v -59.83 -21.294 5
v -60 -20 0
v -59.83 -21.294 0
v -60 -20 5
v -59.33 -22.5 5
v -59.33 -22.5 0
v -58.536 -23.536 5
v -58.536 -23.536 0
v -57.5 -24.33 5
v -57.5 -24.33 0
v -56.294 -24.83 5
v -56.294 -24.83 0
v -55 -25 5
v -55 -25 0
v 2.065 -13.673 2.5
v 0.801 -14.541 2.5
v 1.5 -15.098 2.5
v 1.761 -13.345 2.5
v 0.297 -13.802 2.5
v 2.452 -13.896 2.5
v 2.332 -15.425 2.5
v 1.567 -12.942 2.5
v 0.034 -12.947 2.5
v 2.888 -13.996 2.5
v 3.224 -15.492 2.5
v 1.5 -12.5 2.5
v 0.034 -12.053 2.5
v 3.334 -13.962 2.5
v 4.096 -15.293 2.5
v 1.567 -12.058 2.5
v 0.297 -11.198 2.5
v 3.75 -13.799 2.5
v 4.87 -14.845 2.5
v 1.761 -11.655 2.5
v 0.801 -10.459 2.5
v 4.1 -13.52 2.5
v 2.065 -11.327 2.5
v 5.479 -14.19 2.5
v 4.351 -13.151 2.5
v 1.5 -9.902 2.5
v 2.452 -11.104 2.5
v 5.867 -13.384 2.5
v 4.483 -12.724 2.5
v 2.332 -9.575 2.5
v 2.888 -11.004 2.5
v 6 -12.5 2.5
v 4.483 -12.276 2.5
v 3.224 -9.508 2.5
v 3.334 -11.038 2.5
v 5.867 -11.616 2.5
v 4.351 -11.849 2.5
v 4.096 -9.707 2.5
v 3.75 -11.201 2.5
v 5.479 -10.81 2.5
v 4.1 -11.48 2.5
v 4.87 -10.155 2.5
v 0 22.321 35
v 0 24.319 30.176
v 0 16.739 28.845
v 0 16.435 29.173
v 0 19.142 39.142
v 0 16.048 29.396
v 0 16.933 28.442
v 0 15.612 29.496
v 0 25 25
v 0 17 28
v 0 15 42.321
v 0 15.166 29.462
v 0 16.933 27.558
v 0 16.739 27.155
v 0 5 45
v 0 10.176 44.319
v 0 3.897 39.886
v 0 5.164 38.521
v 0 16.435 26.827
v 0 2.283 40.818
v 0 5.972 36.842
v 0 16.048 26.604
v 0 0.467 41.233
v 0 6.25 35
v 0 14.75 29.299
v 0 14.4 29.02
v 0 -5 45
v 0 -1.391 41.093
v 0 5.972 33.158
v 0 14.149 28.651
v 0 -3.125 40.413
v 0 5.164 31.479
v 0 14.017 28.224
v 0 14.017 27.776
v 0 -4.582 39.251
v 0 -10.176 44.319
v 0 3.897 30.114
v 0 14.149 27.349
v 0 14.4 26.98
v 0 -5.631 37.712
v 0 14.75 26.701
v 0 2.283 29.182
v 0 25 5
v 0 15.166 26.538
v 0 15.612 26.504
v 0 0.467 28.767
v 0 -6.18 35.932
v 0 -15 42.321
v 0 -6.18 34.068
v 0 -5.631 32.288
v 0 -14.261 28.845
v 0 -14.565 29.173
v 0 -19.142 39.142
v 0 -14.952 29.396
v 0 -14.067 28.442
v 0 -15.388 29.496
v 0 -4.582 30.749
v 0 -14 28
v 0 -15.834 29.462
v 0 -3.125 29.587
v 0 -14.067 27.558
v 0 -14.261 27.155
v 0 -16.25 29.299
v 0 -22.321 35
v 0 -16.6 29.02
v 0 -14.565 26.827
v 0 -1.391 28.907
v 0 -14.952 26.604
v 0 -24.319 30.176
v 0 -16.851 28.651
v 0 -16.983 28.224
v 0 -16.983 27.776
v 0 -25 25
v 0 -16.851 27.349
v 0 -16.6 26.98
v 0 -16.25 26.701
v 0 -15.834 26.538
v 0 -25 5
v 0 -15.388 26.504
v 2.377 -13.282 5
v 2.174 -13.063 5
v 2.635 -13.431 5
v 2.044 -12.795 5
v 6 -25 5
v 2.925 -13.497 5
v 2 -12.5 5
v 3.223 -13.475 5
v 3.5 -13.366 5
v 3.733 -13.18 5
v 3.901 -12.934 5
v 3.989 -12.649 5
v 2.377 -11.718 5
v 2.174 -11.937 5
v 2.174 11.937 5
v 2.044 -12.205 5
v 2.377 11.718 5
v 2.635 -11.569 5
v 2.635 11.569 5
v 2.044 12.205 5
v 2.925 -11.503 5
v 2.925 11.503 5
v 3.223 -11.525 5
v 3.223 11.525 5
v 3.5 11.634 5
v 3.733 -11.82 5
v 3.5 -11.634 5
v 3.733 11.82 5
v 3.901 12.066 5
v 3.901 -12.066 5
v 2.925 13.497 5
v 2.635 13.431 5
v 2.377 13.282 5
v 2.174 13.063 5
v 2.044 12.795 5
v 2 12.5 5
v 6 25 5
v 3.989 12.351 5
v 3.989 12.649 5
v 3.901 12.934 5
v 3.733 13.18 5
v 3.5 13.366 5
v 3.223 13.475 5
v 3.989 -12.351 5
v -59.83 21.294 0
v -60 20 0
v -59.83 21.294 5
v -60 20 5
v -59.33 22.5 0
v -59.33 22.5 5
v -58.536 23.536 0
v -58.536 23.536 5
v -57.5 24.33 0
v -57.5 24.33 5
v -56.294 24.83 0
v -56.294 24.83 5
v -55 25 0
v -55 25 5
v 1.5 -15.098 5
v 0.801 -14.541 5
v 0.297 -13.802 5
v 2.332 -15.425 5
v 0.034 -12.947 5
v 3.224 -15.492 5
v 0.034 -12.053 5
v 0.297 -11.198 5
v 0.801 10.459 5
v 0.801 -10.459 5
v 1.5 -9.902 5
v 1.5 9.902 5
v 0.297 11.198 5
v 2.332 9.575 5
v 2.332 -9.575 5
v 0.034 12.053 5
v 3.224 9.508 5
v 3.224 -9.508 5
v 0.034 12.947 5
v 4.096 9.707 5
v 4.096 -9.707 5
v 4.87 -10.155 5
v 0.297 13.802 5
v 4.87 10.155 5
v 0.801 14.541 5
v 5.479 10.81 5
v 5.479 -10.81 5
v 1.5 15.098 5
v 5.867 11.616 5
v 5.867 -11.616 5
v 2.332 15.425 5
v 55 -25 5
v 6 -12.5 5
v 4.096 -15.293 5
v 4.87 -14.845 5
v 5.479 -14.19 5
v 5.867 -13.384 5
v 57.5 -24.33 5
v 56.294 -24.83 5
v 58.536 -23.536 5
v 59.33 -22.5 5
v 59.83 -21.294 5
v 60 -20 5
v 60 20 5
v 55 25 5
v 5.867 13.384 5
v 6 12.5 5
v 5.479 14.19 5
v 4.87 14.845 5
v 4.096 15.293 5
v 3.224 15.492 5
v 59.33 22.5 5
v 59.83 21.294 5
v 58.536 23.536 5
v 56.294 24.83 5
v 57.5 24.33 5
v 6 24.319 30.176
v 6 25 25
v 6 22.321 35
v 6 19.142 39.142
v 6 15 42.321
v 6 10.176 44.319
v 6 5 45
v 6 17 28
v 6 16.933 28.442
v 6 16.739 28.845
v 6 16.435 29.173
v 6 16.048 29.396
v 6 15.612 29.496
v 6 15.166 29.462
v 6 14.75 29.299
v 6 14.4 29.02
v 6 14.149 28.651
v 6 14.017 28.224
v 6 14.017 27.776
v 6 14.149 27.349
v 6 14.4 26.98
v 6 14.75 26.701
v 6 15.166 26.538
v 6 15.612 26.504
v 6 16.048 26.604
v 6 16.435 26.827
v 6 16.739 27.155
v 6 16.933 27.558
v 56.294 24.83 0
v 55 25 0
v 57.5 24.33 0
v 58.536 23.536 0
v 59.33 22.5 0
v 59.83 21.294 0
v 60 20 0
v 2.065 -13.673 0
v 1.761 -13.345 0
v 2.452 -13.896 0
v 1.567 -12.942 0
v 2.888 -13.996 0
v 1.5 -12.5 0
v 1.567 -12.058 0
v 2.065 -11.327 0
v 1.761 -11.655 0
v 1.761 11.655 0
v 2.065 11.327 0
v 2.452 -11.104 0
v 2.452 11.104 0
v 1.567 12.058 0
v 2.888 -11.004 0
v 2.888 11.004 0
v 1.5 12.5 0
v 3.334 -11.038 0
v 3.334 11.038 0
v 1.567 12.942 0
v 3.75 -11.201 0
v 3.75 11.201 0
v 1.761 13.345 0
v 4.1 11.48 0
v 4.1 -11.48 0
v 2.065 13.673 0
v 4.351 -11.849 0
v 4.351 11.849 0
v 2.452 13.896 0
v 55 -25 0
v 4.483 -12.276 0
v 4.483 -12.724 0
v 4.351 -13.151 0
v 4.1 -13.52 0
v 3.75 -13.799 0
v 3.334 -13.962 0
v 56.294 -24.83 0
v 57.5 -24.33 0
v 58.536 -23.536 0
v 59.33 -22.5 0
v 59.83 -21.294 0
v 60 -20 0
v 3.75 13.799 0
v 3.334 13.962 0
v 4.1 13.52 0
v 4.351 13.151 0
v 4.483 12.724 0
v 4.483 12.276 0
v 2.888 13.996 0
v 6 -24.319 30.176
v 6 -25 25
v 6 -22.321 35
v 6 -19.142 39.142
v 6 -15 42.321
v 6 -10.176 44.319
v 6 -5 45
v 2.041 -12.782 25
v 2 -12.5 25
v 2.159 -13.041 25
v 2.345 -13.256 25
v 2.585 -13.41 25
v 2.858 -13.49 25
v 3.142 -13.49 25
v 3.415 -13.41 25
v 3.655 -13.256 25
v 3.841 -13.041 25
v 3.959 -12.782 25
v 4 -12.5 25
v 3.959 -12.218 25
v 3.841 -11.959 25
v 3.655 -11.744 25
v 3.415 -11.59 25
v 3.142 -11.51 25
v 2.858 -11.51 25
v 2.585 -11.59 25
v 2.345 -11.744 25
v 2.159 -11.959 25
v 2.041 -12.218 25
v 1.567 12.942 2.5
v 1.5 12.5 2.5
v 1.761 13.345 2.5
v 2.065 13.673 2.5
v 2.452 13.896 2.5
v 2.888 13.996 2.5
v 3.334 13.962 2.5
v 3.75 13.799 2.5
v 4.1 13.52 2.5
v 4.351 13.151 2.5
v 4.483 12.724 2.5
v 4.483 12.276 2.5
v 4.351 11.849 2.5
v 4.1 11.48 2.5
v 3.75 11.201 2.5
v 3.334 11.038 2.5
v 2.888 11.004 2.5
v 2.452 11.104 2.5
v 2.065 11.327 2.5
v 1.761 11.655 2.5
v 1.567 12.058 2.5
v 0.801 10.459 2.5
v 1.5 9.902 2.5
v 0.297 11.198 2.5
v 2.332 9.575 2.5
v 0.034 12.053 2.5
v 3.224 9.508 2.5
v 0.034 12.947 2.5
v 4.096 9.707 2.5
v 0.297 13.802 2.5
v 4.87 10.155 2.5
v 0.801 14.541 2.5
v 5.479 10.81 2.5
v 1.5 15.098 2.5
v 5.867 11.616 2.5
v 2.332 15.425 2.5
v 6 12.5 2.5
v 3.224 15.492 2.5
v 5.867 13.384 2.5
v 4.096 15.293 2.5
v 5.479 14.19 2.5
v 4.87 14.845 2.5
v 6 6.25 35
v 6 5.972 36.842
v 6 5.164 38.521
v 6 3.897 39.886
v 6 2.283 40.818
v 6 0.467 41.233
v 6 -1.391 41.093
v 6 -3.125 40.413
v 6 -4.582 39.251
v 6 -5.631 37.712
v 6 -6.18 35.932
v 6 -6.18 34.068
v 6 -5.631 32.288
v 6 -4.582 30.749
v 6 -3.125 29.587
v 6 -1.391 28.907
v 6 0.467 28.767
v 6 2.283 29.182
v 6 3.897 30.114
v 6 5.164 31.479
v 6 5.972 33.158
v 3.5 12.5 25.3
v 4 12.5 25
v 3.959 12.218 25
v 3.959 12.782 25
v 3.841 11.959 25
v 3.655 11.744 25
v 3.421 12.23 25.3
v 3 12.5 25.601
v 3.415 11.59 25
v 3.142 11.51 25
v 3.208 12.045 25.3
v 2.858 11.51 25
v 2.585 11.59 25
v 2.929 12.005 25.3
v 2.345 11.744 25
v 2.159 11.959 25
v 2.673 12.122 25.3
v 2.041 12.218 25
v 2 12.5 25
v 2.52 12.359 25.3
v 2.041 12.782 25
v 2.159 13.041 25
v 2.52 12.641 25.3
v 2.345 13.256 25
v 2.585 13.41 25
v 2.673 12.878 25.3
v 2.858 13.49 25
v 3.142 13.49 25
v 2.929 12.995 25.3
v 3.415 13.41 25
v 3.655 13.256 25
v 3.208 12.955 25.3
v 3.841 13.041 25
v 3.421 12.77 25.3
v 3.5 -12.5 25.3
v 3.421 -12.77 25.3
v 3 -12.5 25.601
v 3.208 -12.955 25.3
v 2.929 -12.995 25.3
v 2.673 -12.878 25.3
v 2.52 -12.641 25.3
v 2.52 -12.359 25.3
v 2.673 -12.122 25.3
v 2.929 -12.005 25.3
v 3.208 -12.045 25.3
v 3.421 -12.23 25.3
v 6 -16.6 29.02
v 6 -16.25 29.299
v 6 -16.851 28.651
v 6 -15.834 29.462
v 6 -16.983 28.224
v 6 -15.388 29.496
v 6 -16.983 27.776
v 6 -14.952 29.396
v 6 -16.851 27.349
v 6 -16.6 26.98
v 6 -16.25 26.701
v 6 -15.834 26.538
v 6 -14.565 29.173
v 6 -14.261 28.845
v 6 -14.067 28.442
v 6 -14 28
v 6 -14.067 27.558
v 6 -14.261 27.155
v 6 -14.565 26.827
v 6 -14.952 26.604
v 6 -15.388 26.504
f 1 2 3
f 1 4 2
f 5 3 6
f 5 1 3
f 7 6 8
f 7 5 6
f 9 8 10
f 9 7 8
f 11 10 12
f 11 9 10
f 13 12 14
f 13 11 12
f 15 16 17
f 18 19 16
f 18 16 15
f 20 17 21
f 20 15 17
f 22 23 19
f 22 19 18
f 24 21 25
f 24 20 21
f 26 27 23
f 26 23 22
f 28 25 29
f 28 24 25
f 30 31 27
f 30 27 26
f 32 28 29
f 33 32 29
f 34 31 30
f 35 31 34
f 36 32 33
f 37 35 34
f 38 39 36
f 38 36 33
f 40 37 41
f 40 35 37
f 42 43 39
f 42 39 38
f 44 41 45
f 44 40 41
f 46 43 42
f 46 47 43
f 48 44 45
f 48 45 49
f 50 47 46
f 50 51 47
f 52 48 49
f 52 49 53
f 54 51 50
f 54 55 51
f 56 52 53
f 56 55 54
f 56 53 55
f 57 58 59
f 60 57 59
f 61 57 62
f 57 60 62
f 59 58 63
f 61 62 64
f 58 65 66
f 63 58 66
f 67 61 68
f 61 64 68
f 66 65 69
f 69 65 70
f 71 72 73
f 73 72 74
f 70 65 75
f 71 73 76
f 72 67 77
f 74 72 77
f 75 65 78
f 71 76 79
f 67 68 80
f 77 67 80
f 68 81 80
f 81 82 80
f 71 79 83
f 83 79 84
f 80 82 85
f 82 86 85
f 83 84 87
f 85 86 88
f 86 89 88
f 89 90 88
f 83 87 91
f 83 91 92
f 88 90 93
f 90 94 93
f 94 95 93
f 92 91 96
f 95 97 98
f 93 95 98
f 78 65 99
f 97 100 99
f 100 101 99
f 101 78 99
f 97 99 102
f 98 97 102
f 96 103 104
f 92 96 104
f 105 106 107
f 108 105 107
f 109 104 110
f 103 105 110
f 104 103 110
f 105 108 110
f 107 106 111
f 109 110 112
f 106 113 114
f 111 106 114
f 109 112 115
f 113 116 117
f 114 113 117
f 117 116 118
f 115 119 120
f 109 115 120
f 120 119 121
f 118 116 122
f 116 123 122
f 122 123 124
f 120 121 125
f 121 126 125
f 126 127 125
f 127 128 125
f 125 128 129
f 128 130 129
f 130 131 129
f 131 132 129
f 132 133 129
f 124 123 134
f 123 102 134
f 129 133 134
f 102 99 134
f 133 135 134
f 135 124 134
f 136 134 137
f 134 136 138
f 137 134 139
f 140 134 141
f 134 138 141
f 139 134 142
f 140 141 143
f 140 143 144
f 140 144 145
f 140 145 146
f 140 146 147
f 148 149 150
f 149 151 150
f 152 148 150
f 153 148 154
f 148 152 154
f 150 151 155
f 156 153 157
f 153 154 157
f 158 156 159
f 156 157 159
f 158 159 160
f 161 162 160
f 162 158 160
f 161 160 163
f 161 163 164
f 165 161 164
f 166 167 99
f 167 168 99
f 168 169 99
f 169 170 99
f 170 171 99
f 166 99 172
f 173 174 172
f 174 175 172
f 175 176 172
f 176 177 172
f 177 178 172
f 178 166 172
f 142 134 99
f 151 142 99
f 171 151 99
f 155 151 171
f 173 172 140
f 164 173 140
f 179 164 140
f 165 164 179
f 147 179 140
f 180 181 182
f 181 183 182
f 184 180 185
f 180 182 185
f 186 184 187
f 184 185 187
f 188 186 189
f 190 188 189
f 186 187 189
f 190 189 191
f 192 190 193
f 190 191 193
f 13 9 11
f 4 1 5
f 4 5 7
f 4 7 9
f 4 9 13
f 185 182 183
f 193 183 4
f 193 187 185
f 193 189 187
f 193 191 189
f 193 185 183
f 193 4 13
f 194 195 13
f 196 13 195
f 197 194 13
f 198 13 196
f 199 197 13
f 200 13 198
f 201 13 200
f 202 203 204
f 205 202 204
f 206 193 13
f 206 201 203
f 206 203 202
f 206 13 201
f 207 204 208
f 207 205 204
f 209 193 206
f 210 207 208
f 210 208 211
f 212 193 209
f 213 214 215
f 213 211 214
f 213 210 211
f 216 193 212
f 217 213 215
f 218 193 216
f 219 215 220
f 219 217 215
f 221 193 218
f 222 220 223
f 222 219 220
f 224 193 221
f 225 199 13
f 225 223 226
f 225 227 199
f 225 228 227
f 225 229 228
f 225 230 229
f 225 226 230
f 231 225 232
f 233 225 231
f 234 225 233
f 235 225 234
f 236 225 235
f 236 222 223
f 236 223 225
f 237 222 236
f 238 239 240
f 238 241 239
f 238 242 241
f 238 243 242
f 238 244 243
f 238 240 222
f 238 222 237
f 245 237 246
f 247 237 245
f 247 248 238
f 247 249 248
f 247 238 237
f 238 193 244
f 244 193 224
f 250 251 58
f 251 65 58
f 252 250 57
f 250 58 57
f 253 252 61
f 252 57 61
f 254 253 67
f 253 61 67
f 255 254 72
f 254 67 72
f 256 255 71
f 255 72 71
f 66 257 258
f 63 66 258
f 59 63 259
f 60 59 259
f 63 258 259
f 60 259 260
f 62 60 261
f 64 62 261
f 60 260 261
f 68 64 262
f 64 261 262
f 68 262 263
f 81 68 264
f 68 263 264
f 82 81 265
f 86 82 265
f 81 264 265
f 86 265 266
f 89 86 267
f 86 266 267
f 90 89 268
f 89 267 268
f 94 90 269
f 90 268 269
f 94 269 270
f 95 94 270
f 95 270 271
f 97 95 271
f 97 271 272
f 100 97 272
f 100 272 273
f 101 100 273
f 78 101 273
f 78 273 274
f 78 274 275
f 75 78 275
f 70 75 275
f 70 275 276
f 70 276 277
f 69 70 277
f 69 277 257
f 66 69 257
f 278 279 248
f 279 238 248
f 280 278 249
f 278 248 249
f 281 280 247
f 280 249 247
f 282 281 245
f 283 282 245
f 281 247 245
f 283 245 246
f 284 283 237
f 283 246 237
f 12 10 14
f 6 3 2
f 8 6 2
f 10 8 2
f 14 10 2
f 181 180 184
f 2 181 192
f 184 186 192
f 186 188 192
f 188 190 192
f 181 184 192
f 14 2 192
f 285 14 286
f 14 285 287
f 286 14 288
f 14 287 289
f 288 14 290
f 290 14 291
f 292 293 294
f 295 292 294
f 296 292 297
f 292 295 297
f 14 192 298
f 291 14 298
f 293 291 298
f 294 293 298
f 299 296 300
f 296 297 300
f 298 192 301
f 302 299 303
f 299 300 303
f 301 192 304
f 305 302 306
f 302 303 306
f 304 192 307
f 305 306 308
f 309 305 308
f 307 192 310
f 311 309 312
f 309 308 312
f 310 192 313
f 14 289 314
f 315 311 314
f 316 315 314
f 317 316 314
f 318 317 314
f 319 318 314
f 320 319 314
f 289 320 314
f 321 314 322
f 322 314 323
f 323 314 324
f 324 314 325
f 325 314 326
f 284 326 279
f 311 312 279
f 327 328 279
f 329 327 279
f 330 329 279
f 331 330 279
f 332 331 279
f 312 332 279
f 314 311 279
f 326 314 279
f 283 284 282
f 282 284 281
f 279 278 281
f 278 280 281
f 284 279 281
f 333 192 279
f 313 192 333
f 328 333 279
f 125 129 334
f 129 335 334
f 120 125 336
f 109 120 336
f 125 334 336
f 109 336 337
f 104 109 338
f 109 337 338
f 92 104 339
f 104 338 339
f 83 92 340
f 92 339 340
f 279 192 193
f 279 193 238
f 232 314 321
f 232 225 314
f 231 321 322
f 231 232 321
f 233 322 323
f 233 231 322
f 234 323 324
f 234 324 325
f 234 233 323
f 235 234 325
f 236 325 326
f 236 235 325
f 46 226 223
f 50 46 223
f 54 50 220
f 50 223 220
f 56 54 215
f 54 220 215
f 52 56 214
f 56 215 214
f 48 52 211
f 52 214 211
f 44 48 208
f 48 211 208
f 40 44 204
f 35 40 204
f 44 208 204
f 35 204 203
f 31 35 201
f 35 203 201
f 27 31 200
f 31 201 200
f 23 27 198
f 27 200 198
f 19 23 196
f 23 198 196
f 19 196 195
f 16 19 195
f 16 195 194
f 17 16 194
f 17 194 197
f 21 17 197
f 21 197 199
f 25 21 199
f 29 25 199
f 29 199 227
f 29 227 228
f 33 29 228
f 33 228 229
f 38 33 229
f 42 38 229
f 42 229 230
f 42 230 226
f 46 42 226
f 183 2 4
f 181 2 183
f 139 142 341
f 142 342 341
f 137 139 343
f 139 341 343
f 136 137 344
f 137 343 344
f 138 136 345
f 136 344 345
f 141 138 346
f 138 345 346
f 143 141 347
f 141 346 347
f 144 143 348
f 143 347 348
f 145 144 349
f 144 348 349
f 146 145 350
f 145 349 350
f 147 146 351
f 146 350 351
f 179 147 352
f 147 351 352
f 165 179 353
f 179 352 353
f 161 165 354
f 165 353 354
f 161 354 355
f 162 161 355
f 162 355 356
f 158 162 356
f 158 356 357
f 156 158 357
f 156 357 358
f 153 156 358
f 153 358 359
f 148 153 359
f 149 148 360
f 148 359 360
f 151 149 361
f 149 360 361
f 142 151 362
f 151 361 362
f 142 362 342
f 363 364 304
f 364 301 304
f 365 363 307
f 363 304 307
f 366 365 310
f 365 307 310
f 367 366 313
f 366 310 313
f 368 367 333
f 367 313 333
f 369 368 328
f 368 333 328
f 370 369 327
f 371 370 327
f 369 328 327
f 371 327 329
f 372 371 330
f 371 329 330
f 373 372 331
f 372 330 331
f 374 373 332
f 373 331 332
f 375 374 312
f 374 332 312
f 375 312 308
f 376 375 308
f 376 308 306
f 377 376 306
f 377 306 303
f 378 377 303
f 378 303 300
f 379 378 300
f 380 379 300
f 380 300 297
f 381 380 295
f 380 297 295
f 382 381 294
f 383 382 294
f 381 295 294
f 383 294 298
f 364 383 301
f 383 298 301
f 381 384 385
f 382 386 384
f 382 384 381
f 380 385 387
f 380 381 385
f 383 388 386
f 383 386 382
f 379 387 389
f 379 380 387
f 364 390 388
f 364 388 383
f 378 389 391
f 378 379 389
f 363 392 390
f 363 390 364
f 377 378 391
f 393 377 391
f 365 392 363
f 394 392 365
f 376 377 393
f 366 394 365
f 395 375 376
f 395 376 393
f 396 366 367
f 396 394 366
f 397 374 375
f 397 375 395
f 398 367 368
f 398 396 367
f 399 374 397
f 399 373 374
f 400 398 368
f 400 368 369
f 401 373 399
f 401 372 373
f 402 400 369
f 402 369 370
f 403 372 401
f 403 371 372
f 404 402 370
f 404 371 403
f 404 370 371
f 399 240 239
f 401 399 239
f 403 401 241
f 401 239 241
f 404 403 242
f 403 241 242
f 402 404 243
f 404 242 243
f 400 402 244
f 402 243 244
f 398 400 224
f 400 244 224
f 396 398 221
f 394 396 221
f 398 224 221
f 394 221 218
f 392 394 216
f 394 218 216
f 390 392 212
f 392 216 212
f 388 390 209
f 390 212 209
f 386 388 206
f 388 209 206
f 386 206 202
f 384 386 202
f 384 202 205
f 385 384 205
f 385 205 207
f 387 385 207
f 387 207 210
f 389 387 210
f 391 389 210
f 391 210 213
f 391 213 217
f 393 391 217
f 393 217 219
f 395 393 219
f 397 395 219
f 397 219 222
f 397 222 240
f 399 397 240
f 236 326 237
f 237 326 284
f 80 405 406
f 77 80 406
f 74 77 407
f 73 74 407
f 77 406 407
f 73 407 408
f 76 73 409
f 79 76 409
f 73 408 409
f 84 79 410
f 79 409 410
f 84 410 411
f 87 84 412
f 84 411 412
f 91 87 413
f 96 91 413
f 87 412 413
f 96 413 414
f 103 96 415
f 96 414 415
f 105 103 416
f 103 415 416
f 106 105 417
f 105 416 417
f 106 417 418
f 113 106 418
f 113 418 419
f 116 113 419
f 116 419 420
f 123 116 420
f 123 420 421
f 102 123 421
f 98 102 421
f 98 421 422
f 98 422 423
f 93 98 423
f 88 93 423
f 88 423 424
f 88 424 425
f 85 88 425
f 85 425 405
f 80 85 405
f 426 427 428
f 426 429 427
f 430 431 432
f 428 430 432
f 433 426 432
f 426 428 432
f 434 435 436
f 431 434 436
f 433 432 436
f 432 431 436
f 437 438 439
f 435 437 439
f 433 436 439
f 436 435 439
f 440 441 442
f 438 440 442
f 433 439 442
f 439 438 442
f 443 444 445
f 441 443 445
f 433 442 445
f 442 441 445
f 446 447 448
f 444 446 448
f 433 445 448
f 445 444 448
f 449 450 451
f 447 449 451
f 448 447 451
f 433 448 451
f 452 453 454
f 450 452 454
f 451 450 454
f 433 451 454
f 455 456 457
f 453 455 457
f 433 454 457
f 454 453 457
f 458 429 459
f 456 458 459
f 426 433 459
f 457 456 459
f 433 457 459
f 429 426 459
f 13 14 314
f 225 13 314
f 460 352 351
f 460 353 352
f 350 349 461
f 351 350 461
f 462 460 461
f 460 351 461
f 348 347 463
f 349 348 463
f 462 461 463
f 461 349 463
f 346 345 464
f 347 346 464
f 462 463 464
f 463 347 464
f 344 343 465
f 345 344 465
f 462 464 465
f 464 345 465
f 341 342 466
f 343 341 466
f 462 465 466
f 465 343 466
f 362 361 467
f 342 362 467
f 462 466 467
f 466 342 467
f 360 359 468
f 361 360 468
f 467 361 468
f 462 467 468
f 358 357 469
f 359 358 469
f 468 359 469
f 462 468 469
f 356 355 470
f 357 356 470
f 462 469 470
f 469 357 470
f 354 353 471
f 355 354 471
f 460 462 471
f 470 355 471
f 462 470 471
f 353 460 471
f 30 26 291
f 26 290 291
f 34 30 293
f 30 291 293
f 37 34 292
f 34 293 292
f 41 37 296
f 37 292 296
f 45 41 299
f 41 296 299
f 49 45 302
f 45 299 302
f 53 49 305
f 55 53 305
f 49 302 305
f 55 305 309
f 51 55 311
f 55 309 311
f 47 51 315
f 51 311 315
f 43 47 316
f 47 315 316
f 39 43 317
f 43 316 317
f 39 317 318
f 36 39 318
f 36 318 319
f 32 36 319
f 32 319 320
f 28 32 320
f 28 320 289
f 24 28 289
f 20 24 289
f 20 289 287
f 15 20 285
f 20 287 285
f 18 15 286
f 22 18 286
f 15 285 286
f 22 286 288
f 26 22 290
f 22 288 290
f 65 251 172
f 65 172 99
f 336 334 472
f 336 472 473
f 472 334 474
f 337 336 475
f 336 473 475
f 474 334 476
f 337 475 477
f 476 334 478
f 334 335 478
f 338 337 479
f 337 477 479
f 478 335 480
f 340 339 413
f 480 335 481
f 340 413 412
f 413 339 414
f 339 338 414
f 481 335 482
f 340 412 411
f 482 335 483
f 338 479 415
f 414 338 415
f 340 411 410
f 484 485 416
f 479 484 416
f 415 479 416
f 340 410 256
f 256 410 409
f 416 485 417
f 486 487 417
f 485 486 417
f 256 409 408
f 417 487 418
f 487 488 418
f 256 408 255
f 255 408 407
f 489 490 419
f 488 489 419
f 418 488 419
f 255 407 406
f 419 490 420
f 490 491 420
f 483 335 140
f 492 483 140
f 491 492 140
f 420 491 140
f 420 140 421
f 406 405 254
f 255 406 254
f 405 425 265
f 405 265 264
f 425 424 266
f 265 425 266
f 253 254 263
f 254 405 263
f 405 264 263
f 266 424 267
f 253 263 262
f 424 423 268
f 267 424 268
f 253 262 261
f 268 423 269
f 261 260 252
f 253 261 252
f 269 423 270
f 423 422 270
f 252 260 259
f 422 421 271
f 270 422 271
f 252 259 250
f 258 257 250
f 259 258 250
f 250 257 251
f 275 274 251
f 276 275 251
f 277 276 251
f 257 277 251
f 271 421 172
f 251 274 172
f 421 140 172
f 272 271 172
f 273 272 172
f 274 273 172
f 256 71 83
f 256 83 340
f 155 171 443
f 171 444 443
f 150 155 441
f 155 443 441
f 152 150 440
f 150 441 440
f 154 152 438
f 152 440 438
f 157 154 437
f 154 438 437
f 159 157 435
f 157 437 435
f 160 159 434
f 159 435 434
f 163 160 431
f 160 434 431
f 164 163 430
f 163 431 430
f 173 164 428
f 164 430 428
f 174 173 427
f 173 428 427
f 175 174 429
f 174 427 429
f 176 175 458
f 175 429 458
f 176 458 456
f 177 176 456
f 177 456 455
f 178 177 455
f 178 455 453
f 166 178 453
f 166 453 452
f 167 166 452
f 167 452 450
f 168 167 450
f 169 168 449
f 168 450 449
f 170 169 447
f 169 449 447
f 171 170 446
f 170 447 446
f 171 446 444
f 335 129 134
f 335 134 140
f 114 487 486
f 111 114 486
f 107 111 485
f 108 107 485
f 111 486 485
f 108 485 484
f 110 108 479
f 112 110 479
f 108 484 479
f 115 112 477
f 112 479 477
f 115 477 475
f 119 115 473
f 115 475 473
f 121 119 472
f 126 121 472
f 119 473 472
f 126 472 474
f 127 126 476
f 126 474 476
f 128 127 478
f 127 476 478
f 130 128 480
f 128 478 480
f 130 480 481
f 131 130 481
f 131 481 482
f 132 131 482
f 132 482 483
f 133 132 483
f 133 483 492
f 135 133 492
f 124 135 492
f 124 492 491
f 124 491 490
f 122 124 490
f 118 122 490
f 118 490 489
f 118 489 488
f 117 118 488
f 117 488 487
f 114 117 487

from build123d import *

# Parameters (mm, degrees)
F0_W           = 120
F0_H           = 50
F1_DEPTH       = 5
F3_DEPTH       = 40
F4_R           = 20
F6_D           = 12.5
F7_D           = 3
F8_D           = 3
F8_CBORE_D     = 6
F8_CBORE_DEPTH = 2.5
F9_D           = 2
F9_DEPTH       = 20
F9_TIP         = 0.600860619
F10_R          = 5


with BuildPart() as f1:
    # F0 (on Top) → F1 (new body)
    with BuildSketch(Plane.XY):
        Rectangle(F0_W, F0_H)
    extrude(amount=F1_DEPTH)

    # F8 (through all)
    with Locations(Plane.XY.offset(5)):
        with Locations((3, 12.5), (3, -12.5)):
            CounterBoreHole(F8_D / 2, F8_CBORE_D / 2, F8_CBORE_DEPTH)

    # F10
    f10_edges = [f1.edges().sort_by_distance(p)[0] for p in [
        (-60, -25, 2.5),
        (-60, 25, 2.5),
        (60, -25, 2.5),
        (60, 25, 2.5),
    ]]
    fillet(f10_edges, radius=F10_R)


with BuildPart() as f3:
    # F2 (on face) → F3 (new body)
    with BuildSketch(Plane.XY.offset(5)):
        Polygon((6, 25), (0, 25), (0, 0), align=None)
        Polygon((6, -25), (6, 25), (0, 0), (0, -25), align=None)
    extrude(amount=F3_DEPTH)

    # F4
    f4_edges = [f3.edges().sort_by_distance(p)[0] for p in [
        (3, -25, 45),
        (3, 25, 45),
    ]]
    fillet(f4_edges, radius=F4_R)

    # F6 (through all)
    with Locations(Plane(origin=(0, 0, 0), x_dir=(0, -1, 0), z_dir=(-1, 0, 0))):
        with Locations((0, 35)):
            Hole(F6_D / 2)

    # F7 (through all)
    with Locations(Plane(origin=(0, 0, 0), x_dir=(0, -1, 0), z_dir=(-1, 0, 0))):
        with Locations((-15.5, 28), (15.5, 28)):
            Hole(F7_D / 2)

    # F9
    with Locations(Plane(origin=(0, 0, 5), x_dir=(1, 0, 0), z_dir=(0, 0, -1))):
        with Locations((3, 12.5), (3, -12.5)):
            Hole(F9_D / 2, depth=F9_DEPTH)
            with Locations((0, 0, -(F9_DEPTH + F9_TIP / 2))):  # 118° drill point
                Cone(0, F9_D / 2, F9_TIP, mode=Mode.SUBTRACT)


solid = Compound([f1.part, f3.part])
